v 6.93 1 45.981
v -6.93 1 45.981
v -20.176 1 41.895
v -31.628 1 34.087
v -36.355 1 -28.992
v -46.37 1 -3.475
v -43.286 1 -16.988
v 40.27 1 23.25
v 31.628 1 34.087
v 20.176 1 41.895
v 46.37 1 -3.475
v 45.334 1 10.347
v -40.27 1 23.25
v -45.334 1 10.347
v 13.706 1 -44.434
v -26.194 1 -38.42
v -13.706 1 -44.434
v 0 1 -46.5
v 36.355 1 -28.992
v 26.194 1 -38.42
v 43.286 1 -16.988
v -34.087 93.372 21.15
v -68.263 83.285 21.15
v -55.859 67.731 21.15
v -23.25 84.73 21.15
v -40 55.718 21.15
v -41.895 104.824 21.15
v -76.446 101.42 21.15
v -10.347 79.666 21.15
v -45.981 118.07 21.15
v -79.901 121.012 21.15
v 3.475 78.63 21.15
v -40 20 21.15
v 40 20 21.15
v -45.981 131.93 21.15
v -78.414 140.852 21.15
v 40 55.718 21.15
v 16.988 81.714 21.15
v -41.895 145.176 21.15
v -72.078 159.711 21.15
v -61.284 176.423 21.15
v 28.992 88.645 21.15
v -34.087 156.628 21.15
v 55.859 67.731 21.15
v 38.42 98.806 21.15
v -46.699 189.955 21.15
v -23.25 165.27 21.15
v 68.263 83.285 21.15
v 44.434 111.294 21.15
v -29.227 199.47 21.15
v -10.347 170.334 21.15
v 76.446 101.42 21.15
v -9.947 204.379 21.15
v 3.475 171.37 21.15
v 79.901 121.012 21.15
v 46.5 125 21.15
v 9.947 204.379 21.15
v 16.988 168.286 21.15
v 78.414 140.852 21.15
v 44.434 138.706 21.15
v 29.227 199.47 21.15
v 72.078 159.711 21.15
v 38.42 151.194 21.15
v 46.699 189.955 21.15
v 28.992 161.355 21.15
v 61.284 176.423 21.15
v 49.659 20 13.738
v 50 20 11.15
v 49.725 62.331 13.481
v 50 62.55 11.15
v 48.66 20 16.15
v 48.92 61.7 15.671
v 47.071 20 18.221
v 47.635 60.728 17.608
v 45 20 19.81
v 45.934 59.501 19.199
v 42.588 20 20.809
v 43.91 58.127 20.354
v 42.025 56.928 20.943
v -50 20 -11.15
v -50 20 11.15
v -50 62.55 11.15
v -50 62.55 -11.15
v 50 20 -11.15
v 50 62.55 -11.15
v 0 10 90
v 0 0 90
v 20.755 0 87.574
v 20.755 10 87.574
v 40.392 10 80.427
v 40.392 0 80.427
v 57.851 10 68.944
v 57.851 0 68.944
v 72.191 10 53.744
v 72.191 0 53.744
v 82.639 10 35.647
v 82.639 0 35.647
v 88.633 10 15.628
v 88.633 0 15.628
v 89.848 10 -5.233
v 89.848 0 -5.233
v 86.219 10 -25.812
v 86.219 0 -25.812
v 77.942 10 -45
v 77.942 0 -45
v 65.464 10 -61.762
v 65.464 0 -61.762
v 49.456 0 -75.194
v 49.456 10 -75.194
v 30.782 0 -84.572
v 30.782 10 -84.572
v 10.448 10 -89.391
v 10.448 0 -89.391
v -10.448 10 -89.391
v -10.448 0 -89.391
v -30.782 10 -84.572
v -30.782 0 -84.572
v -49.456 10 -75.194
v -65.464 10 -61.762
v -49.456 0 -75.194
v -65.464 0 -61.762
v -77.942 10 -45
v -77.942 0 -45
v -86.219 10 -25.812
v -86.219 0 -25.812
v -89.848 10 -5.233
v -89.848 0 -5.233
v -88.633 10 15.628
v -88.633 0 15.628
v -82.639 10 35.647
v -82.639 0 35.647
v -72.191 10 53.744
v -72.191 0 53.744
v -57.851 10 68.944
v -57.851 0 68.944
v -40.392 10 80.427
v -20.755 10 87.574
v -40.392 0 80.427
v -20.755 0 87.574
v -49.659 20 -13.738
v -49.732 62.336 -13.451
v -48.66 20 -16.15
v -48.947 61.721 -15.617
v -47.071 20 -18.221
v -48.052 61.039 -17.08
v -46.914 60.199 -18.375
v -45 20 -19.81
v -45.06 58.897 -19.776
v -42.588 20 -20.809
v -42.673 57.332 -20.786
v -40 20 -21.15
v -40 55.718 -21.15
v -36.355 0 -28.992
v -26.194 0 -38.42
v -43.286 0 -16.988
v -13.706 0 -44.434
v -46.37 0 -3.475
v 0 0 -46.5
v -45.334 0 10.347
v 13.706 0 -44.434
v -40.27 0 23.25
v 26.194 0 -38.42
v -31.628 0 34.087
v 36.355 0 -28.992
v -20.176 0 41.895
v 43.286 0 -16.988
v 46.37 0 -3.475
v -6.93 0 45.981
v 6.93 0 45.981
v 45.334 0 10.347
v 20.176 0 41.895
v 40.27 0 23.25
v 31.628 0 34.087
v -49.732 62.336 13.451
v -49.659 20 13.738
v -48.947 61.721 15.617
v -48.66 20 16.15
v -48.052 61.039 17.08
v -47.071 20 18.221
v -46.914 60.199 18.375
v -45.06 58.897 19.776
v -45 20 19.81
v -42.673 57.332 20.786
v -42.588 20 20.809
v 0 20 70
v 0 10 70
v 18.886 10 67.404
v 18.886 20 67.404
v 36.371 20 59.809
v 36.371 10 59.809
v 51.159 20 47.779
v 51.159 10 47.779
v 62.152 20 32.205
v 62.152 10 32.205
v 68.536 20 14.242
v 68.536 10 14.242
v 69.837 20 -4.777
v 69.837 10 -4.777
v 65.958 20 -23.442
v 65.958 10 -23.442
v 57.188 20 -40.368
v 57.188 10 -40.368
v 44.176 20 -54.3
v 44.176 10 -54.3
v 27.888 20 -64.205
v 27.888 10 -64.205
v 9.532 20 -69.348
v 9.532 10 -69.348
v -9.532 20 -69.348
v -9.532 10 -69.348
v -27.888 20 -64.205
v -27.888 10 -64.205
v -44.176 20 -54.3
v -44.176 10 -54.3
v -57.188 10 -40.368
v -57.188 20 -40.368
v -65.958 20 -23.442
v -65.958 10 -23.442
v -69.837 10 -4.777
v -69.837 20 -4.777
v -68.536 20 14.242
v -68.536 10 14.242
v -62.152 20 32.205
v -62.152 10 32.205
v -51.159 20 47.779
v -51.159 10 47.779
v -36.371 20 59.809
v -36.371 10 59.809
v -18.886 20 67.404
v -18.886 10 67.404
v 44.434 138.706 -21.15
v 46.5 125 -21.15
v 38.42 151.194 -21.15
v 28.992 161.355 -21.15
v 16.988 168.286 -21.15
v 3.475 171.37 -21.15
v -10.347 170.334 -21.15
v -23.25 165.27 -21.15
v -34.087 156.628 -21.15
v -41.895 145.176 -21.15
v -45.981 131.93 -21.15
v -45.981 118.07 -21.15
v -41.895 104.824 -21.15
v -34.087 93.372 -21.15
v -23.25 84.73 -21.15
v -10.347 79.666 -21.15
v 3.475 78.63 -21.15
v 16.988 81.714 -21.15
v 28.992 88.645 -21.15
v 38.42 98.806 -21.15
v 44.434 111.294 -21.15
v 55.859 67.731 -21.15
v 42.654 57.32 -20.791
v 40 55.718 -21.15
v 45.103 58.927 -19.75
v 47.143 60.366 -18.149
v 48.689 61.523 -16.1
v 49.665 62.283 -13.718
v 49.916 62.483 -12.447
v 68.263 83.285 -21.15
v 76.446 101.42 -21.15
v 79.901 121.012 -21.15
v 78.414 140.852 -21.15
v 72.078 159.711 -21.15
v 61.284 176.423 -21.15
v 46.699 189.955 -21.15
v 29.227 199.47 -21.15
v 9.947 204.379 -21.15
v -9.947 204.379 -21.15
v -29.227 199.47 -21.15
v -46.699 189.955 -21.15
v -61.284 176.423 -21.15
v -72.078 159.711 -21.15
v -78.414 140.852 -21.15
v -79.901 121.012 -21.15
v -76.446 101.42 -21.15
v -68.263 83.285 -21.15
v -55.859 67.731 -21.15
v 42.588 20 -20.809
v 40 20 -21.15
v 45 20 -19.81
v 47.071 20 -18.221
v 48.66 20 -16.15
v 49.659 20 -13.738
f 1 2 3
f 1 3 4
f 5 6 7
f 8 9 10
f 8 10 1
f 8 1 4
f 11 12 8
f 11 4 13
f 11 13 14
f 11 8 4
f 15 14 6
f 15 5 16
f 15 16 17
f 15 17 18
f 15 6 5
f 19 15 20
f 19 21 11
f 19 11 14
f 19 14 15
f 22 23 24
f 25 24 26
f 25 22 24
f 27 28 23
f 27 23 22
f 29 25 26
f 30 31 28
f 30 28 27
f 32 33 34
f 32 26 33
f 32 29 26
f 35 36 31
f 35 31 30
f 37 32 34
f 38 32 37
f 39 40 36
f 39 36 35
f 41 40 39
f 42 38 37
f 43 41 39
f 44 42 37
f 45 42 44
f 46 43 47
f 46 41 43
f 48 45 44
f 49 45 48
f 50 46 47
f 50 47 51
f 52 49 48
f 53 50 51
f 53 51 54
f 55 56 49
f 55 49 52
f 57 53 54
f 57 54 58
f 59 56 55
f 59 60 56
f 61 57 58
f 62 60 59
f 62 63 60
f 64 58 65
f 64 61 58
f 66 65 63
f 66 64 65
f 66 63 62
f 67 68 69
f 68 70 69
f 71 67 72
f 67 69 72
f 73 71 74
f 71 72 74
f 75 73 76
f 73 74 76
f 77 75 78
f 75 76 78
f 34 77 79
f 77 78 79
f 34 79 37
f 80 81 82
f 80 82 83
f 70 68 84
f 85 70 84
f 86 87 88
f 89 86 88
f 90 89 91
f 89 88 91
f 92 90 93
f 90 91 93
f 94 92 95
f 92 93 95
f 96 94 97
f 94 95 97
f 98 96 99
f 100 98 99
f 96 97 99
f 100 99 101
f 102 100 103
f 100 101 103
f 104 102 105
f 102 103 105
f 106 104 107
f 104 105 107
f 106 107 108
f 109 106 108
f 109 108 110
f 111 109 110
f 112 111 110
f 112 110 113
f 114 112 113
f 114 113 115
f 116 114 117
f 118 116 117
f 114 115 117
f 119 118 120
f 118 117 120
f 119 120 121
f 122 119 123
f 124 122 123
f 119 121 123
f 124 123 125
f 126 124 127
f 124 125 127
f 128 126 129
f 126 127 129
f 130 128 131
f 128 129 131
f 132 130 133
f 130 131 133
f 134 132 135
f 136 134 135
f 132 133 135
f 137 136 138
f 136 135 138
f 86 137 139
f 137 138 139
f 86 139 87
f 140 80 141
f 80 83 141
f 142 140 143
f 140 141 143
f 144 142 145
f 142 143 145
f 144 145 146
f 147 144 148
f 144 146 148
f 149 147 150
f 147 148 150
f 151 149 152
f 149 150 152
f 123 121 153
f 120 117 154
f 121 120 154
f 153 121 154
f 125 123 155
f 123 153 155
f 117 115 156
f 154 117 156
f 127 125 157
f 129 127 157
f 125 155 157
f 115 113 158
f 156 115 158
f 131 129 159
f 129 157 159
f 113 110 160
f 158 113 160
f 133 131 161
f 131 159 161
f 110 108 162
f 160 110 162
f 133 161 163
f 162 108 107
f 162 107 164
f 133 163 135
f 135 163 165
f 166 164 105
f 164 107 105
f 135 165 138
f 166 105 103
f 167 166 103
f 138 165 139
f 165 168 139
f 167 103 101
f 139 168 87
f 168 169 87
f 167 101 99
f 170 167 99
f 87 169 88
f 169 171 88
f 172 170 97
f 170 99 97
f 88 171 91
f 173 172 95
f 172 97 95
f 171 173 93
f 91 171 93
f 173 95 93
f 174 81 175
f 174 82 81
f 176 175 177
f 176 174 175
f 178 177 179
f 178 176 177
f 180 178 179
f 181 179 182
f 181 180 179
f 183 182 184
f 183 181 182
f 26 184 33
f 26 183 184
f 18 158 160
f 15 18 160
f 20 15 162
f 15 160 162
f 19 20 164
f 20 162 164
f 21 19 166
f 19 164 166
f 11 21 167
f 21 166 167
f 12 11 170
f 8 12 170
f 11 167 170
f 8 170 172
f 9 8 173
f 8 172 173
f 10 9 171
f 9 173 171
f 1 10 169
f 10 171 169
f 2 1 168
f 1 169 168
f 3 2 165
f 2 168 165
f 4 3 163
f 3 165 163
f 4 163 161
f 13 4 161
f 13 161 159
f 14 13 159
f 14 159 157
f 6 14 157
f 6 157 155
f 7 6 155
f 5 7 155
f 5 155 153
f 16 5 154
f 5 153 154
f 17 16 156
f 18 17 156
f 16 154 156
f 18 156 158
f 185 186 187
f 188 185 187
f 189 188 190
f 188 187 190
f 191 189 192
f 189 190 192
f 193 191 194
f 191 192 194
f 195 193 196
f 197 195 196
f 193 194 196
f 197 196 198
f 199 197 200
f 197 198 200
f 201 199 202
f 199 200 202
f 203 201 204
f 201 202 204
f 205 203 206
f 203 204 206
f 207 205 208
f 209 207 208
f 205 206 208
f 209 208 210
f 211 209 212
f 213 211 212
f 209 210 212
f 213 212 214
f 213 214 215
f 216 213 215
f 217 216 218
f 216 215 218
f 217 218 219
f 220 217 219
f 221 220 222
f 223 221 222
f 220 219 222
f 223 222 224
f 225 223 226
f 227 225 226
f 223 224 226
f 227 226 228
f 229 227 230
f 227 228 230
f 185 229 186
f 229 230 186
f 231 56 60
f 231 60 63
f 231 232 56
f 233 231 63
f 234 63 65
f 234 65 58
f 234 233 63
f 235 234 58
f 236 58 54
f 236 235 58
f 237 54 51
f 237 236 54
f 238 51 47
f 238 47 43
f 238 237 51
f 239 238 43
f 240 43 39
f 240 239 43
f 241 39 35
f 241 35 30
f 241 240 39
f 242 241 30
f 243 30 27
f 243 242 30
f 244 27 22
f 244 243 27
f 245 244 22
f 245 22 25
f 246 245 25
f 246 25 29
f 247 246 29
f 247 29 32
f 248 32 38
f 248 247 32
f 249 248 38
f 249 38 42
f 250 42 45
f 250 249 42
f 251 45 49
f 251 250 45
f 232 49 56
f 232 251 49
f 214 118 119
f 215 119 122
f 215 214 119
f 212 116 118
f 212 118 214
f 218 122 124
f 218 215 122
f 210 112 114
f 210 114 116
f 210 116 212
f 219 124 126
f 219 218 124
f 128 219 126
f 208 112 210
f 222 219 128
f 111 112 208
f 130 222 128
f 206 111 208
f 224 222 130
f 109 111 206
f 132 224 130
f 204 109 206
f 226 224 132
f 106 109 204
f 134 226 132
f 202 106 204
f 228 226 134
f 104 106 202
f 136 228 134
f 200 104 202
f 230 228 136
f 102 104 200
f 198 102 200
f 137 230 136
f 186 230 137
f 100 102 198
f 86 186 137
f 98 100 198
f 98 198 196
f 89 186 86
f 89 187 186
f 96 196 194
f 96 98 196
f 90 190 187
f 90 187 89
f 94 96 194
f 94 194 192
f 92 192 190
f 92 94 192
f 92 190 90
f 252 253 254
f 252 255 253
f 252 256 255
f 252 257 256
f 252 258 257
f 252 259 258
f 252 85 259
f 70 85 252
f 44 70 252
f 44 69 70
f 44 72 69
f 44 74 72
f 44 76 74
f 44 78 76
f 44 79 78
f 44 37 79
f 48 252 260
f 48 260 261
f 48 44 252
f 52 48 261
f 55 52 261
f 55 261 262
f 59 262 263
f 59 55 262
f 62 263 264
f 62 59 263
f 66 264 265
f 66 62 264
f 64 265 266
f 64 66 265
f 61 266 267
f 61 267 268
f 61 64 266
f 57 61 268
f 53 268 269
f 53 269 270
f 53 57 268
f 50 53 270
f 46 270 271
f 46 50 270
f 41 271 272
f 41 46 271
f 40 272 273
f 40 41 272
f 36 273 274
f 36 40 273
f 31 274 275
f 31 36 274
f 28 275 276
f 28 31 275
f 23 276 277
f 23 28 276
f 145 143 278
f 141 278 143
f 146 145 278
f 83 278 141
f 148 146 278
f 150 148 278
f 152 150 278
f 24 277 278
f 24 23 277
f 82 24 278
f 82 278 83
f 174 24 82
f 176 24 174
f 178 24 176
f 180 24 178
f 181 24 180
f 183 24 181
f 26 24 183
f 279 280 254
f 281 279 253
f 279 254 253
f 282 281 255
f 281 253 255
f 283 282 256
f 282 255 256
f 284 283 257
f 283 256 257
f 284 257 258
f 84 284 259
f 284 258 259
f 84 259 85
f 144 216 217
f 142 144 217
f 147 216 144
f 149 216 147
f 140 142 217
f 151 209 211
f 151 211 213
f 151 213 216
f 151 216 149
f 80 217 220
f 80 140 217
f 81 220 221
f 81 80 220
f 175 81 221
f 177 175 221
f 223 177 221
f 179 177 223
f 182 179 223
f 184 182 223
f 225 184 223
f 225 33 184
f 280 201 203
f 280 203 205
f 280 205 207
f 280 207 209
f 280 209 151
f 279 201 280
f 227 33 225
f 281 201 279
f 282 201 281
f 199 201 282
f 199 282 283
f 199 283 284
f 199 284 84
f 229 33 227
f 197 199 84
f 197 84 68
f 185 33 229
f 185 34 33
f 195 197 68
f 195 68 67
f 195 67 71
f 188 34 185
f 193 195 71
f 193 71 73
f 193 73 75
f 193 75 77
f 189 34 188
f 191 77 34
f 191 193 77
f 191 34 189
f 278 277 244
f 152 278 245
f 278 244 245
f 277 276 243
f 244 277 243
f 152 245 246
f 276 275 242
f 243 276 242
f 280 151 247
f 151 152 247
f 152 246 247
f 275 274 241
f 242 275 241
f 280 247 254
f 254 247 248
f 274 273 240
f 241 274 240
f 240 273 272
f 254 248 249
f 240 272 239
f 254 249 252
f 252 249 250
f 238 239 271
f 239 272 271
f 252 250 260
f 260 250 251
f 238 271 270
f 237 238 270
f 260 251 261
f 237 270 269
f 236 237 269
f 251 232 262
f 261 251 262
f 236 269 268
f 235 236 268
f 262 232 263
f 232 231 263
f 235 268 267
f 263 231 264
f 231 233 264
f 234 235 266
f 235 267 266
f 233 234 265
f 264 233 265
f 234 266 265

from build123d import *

# Parameters (mm, degrees)
SKETCH_1_R           = 90
EXTRUDE_1_DEPTH      = 10
SKETCH_2_R           = 70
EXTRUDE_2_DEPTH      = 10
SKETCH_4_R           = 80
SKETCH_4_R_2         = 46.5
EXTRUDE_3_DEPTH      = 21.15
EXTRUDE_4_REACH      = 226.555
EXTRUDE_4_END_RADIUS = 80
SKETCH_5_W           = 100
SKETCH_5_H           = 42.3
FILLET_1_R           = 10
SKETCH_6_R           = 46.5
CUT_EXTRUDE_1_DEPTH  = 1


with BuildPart() as part:
    # 草图1 → 凸台-拉伸1 (new body)
    with BuildSketch(Plane(origin=(0, 0, 0), x_dir=(1, 0, 0), z_dir=(0, 1, 0))):
        with Locations(Location((0, 0, 0), (0, 0, 270))):
            Circle(SKETCH_1_R)
    extrude(amount=EXTRUDE_1_DEPTH)

    # 草图2 → 凸台-拉伸2 (add)
    with BuildSketch(Plane(origin=(0, 10, 0), x_dir=(1, 0, 0), z_dir=(0, 1, 0))):
        with Locations(Location((0, 0, 0), (0, 0, 270))):
            Circle(SKETCH_2_R)
    extrude(amount=EXTRUDE_2_DEPTH)



with BuildPart() as body_2:
    # 草图4 → 凸台-拉伸3 (new, symmetric)
    with BuildSketch(Plane.XY):
        with Locations((0, 125)):
            Circle(SKETCH_4_R)
        with Locations((0, 125)):
            Circle(SKETCH_4_R_2, mode=Mode.SUBTRACT)
    extrude(amount=EXTRUDE_3_DEPTH, both=True)


with BuildPart() as part_1:
    add(part.part)

    add(body_2.part)  # 凸台-拉伸4 merges body 2
    # 凸台-拉伸4: up to this cylinder (the profile starts outside it)
    extrude_4_end = Plane(origin=(0, 125, 0), z_dir=(0, 0, -1)) * Cylinder(EXTRUDE_4_END_RADIUS, 614.11, mode=Mode.PRIVATE)
    # 草图5 → 凸台-拉伸4 (add, up to the surface)
    with BuildSketch(Plane(origin=(0, 20, 0), x_dir=(1, 0, 0), z_dir=(0, 1, 0)), mode=Mode.PRIVATE) as extrude_4_sk1:
        Rectangle(SKETCH_5_W, SKETCH_5_H)
    extrude_4_tool1 = extrude(extrude_4_sk1.sketch, amount=EXTRUDE_4_REACH, mode=Mode.PRIVATE) - extrude_4_end
    add(extrude_4_tool1.solids().sort_by_distance((0, 20, 0))[0])

    # 圆角1
    fillet_1_edges = [part_1.edges().sort_by_distance(p)[0] for p in [
        (50, 41.275010008, -21.15),
        (50, 41.275010008, 21.15),
        (-50, 41.275010008, -21.15),
        (-50, 41.275010008, 21.15),
    ]]
    fillet(fillet_1_edges, radius=FILLET_1_R)

    # 草图6 → 切除-拉伸1 (cut)
    with BuildSketch(Plane.XZ):
        with Locations(Location((0, 0, 0), (0, 0, 270))):
            Circle(SKETCH_6_R)
    extrude(amount=-CUT_EXTRUDE_1_DEPTH, mode=Mode.SUBTRACT)


solid = part_1.part
